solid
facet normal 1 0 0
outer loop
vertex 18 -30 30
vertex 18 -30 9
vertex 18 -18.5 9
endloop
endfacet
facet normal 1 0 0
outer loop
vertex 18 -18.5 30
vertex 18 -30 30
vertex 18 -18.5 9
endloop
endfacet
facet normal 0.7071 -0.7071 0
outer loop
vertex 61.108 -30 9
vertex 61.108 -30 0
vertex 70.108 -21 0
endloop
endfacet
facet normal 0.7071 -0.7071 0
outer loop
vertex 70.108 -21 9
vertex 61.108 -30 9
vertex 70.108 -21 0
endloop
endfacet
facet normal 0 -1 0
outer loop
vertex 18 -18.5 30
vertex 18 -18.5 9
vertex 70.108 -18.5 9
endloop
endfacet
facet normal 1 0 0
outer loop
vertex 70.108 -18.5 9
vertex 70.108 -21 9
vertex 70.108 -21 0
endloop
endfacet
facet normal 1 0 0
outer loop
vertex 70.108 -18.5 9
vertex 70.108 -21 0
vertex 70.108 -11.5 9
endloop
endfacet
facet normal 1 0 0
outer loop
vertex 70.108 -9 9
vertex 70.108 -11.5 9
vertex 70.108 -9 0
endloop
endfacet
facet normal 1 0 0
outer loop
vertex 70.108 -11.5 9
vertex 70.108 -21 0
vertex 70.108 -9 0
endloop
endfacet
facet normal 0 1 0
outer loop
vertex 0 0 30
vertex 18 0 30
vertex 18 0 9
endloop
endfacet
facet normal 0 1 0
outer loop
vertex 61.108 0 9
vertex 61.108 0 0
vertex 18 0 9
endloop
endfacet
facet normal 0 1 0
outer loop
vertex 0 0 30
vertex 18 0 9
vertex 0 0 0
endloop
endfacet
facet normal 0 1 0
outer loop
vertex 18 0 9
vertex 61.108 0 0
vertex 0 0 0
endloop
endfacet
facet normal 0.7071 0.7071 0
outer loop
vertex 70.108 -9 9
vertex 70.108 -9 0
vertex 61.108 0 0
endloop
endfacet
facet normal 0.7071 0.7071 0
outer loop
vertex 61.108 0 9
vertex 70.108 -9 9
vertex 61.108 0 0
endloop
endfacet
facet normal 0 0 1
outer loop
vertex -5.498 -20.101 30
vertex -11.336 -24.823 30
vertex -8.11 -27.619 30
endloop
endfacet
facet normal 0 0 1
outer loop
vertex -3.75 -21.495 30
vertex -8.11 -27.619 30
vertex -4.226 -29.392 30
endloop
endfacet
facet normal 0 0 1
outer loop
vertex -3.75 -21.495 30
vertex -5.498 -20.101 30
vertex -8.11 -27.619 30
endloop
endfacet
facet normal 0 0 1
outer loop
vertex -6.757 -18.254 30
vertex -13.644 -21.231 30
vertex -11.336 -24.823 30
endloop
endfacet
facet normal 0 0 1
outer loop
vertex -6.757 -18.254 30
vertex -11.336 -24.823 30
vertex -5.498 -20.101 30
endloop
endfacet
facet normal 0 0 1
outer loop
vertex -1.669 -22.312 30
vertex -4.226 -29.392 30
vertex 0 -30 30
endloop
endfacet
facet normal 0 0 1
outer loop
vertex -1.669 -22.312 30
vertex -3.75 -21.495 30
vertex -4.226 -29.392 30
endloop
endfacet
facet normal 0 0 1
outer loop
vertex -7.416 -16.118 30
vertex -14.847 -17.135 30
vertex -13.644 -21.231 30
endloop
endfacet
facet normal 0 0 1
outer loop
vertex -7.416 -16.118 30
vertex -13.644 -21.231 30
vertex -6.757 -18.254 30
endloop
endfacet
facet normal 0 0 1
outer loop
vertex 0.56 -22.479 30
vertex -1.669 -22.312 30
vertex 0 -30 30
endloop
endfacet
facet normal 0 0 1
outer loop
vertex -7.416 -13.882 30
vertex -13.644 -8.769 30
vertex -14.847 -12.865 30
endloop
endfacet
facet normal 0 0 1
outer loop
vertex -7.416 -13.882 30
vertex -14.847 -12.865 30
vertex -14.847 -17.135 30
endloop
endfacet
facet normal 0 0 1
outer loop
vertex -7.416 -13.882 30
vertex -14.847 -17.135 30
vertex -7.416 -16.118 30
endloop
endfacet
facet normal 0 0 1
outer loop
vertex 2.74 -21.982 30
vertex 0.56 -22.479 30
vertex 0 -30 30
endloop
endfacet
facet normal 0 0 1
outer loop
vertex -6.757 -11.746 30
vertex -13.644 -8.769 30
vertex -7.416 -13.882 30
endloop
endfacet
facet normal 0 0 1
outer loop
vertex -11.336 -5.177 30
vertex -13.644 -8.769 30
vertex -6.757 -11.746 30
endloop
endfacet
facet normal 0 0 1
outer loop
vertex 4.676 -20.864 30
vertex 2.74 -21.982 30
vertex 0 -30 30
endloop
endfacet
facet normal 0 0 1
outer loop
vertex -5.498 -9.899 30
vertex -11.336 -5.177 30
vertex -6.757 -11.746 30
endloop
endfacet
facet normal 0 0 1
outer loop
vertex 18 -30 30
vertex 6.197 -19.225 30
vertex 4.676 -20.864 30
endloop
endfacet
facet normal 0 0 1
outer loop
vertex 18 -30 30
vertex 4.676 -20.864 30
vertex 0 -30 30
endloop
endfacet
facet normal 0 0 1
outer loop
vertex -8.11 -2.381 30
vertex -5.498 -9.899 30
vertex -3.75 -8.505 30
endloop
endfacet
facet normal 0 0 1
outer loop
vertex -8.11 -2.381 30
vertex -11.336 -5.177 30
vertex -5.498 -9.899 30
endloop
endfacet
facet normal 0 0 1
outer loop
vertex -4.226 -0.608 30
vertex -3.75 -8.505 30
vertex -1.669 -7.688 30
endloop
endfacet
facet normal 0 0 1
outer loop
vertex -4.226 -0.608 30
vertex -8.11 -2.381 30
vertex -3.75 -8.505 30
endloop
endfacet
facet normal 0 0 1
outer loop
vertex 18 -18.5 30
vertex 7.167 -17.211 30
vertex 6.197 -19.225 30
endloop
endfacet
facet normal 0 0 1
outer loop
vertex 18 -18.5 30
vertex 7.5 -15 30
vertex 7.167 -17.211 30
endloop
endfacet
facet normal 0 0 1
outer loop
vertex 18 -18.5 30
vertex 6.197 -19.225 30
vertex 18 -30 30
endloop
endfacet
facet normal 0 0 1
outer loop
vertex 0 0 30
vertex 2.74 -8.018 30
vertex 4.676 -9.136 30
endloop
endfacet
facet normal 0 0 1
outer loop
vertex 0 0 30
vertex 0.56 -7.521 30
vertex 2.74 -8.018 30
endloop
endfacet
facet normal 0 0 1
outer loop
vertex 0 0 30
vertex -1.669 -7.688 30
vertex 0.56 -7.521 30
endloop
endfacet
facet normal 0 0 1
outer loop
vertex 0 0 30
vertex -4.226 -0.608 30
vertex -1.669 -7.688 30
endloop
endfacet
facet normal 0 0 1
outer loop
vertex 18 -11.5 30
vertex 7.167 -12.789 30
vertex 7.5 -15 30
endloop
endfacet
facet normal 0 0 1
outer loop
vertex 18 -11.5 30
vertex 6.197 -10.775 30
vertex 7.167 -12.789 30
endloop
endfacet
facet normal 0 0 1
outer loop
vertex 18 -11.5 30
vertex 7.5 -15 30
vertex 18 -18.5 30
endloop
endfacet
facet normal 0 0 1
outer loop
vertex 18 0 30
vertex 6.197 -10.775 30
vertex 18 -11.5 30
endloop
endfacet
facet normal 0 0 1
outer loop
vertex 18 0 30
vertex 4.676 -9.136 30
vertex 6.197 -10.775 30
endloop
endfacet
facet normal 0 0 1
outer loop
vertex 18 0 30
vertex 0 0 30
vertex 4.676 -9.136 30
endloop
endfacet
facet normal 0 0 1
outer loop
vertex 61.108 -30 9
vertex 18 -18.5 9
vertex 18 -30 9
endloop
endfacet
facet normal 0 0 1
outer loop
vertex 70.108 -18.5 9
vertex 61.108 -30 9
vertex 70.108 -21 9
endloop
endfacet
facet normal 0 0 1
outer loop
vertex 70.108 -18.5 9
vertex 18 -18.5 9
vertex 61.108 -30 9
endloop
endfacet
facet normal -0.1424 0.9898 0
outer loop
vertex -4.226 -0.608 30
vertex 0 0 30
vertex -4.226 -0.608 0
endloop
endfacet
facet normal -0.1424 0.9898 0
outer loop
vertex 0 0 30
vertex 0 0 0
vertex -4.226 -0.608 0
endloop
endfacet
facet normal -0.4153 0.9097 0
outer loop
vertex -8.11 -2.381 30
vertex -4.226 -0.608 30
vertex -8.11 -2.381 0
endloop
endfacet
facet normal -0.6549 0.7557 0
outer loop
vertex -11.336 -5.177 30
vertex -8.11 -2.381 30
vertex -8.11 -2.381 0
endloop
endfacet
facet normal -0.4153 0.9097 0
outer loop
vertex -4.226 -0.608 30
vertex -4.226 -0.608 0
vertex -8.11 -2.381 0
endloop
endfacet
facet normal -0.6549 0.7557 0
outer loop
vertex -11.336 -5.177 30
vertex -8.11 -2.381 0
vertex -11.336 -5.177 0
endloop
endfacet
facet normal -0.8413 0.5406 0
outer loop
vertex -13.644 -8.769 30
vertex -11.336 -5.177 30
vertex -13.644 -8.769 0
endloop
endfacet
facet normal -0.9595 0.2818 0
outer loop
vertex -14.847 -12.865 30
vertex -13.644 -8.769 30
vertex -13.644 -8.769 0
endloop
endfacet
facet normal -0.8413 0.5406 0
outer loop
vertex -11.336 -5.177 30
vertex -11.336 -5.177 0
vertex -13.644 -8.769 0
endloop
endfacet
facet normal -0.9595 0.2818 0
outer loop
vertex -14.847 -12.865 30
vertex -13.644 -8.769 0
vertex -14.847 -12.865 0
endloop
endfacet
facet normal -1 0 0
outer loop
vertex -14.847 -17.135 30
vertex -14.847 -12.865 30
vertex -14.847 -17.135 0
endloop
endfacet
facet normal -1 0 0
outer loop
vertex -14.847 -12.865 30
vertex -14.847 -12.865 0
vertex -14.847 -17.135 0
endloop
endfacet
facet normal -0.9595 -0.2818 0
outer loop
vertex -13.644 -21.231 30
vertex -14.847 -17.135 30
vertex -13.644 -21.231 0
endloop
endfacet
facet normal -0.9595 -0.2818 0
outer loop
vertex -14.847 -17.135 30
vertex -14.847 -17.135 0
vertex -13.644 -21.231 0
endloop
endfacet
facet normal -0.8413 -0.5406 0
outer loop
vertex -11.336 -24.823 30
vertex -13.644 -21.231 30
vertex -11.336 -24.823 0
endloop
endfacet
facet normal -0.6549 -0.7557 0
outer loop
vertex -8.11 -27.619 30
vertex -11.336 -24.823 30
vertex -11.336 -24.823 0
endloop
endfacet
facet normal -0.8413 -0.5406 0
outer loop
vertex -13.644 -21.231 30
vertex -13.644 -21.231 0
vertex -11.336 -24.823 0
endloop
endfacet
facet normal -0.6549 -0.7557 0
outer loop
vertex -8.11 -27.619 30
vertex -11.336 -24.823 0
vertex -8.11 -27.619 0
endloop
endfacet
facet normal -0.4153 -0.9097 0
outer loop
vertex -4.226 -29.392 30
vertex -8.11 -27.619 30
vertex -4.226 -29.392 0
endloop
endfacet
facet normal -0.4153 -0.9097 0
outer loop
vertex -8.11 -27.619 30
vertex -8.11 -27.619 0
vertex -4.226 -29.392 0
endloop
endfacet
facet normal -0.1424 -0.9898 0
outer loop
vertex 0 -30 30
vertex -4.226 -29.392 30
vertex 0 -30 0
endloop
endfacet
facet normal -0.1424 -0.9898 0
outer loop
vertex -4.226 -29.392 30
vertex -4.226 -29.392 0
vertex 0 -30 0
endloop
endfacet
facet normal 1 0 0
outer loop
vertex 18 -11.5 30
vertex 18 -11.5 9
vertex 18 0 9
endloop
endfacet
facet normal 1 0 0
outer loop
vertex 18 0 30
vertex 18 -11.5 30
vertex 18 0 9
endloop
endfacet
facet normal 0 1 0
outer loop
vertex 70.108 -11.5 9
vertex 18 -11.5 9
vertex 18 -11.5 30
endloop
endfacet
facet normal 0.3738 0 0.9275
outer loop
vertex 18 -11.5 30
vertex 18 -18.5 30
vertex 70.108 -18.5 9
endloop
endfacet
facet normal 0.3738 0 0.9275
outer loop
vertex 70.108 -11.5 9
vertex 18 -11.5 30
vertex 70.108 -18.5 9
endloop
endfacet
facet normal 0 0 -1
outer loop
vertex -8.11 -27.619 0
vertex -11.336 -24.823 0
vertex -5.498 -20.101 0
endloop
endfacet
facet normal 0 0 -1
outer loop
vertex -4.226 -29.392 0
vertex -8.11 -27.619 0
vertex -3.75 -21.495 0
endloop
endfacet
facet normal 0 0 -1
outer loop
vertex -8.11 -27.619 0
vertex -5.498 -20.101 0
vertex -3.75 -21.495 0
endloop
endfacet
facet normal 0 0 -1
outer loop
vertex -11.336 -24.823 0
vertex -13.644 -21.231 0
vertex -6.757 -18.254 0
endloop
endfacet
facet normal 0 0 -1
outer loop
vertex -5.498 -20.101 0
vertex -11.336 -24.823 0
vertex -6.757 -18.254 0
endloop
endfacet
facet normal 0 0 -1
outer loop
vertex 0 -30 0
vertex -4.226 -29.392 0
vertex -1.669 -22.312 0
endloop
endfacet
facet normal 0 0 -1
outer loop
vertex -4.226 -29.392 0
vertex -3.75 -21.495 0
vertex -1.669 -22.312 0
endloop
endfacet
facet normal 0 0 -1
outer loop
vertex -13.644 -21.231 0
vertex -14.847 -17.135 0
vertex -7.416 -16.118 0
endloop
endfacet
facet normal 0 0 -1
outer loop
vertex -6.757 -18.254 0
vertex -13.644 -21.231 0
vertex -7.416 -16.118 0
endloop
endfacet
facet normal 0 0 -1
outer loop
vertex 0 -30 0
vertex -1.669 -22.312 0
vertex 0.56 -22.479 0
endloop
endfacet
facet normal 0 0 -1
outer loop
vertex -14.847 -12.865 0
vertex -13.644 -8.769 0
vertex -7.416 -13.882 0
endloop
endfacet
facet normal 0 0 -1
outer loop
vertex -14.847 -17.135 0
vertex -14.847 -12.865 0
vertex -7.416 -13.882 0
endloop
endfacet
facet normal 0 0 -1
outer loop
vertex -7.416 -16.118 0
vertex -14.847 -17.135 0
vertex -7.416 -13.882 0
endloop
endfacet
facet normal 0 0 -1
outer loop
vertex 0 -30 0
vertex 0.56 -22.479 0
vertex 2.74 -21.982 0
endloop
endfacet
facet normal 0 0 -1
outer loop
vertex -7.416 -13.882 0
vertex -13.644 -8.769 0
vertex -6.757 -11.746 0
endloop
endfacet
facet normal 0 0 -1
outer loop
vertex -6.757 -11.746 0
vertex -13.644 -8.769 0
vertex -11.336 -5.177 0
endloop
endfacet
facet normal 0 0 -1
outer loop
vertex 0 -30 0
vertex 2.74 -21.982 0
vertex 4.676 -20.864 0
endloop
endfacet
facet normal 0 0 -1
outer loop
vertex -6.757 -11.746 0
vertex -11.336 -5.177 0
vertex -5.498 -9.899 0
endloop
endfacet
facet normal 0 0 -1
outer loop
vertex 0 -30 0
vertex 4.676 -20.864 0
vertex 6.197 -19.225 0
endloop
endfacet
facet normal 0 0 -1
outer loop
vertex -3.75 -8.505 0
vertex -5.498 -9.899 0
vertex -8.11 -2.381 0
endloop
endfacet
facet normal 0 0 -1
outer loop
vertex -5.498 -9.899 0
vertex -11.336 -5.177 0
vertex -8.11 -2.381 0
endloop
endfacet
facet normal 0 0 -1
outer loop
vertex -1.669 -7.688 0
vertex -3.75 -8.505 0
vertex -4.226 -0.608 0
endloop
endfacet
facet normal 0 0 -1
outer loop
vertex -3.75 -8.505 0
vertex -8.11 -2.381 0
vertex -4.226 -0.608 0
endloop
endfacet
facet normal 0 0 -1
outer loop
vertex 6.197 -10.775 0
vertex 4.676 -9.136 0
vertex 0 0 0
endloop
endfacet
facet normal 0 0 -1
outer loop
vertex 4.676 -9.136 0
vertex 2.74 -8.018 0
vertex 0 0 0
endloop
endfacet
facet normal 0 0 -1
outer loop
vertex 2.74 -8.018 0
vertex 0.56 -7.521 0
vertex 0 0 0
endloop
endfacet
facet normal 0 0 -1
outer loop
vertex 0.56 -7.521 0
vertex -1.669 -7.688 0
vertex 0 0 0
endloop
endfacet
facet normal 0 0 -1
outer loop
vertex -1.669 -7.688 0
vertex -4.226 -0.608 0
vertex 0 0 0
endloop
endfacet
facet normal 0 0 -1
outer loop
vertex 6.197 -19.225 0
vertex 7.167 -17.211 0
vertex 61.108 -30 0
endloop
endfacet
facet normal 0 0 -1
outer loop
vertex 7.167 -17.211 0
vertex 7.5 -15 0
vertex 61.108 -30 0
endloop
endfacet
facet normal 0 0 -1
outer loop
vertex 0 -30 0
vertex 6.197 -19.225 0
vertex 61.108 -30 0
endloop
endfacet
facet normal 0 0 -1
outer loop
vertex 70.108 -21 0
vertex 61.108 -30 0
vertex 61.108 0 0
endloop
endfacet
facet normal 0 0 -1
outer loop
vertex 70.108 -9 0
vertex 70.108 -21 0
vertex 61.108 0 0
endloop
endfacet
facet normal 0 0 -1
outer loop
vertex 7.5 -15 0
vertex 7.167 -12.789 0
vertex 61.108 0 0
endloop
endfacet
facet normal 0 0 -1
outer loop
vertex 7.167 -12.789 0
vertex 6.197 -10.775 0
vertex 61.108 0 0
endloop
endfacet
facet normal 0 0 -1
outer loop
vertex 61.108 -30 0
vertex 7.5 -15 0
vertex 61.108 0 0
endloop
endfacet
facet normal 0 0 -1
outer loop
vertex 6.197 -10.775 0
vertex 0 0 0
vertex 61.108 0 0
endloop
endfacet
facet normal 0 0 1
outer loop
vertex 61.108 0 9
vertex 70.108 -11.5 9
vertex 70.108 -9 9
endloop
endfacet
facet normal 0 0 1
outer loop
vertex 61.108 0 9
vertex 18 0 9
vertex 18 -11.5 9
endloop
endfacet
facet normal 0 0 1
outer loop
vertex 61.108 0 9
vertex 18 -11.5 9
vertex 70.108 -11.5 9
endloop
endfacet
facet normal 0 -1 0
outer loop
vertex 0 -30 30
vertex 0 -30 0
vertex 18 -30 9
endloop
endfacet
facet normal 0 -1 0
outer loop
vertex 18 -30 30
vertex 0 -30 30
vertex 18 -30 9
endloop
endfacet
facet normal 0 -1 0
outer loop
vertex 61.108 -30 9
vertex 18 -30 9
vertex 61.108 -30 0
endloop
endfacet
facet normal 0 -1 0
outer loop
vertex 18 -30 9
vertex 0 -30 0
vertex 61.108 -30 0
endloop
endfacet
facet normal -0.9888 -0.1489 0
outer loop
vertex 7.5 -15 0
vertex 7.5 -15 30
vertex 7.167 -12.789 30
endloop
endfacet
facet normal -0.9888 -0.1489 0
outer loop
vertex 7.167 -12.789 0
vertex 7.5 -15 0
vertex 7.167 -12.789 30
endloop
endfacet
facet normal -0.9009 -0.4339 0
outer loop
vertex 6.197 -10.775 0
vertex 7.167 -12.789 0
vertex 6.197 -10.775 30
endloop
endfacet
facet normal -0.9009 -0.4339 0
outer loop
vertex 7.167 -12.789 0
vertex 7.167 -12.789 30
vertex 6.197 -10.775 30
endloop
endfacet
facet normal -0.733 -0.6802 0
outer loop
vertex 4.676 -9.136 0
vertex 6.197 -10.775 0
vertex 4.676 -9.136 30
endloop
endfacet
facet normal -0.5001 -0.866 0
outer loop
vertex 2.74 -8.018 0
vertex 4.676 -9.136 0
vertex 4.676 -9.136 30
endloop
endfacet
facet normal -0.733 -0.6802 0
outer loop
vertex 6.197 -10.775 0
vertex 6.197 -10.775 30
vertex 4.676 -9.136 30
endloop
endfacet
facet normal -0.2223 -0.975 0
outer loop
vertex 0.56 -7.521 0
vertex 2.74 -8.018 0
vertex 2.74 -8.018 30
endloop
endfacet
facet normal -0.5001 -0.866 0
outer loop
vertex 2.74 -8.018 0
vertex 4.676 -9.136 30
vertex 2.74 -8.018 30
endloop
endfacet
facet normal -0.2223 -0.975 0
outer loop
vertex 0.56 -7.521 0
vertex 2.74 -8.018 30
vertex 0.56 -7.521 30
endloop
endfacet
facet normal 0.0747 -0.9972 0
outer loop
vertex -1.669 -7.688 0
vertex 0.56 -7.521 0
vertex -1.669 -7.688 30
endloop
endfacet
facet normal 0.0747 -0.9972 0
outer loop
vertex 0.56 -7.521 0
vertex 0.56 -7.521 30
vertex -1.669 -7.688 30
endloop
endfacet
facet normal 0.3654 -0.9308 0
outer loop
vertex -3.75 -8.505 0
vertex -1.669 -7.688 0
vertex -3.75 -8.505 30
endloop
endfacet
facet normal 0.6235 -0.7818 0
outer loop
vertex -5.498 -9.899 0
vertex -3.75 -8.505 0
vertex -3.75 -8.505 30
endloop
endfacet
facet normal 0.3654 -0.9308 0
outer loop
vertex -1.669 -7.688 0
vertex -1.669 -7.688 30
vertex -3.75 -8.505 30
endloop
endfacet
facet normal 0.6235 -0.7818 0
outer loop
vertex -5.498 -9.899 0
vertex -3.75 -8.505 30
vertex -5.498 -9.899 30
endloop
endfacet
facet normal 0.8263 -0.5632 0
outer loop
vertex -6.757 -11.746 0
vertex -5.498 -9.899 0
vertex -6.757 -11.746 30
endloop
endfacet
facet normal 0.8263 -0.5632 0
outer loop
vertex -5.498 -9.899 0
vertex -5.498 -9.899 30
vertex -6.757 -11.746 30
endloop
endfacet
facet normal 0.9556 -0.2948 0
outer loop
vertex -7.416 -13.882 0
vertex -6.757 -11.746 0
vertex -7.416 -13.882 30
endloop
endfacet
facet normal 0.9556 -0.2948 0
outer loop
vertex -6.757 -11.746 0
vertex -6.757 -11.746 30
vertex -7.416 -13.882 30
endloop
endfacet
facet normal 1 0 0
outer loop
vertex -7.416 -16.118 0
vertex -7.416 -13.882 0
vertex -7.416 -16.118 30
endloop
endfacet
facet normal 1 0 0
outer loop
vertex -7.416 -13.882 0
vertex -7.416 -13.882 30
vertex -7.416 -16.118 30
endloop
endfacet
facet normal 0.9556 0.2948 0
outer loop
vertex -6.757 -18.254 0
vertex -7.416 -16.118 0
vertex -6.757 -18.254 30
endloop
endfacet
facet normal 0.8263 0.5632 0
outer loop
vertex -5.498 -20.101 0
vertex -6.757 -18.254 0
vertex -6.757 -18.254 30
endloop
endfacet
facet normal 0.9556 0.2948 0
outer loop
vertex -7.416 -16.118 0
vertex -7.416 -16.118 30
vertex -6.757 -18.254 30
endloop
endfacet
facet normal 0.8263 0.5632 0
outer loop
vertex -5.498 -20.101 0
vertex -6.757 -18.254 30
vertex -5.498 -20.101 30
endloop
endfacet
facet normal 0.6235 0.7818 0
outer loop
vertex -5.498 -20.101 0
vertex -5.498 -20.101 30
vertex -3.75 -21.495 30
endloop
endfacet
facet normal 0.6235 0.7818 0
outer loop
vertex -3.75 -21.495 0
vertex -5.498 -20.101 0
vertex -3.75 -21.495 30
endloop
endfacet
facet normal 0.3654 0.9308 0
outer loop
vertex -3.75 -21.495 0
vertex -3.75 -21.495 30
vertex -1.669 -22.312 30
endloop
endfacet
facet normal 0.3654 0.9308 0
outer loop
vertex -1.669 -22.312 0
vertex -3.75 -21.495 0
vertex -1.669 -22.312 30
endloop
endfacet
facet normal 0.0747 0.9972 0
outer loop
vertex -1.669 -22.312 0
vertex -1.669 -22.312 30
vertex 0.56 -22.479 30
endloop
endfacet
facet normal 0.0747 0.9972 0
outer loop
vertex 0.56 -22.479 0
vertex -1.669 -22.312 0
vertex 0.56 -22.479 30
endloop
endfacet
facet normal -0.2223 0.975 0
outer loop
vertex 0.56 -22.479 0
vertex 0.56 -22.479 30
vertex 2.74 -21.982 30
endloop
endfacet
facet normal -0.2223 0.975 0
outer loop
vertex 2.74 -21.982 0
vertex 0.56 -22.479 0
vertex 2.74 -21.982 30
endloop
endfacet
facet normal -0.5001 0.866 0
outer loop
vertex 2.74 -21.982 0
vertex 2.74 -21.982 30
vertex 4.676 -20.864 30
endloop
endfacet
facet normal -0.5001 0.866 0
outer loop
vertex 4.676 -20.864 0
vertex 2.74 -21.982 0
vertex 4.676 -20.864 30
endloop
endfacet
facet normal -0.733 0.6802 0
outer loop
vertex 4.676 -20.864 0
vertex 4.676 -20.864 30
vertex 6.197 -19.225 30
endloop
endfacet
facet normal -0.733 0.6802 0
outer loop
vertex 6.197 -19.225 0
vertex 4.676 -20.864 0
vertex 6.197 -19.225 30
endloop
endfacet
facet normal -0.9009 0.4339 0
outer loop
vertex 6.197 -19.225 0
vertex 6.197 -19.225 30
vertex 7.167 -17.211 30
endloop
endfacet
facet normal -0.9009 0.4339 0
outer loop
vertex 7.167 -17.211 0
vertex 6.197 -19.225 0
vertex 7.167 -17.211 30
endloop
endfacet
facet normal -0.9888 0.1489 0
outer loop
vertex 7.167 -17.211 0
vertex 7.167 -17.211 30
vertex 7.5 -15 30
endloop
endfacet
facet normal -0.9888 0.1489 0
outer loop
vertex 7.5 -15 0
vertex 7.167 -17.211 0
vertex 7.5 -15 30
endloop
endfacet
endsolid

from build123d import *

# Parameters (mm, degrees)
F1_DEPTH = 9
F3_DEPTH = 21
F4_R     = 7.5
F5_DEPTH = 37.3
F6_W     = 52.1081472671
F6_H     = 7
F7_DEPTH = 21
F9_DEPTH = 25


with BuildPart() as f1:
    # F0 (on Top) → F1 (new body)
    with BuildSketch(Plane.XY):
        with BuildLine():
            Line((61.1081472671, 0), (0, 0))
            ThreePointArc((0, 0), (-15, -15), (0, -30))
            Line((0, -30), (61.1081472671, -30))
            Line((61.1081472671, -30), (70.1081472671, -21))
            Line((70.1081472671, -21), (70.1081472671, -9))
            Line((70.1081472671, -9), (61.1081472671, 0))
        make_face()
    extrude(amount=F1_DEPTH)

    # F2 (on face) → F3 (join)
    with BuildSketch(Plane.XY.offset(9)):
        with BuildLine():
            Line((18, -30), (18, 0))
            Line((18, 0), (0, 0))
            ThreePointArc((0, 0), (-15, -15), (0, -30))
            Line((0, -30), (18, -30))
        make_face()
    extrude(amount=F3_DEPTH)

    # F4 (on face) → F5 (cut)
    with BuildSketch(Plane.XY.offset(30)):
        with Locations((0, -15)):
            Circle(F4_R)
    extrude(amount=-F5_DEPTH, mode=Mode.SUBTRACT)

    # F6 (on face) → F7 (join)
    with BuildSketch(Plane.XY.offset(9)):
        with Locations((44.0540736336, -15)):
            Rectangle(F6_W, F6_H)
    extrude(amount=F7_DEPTH)

    # F8 (on face) → F9 (cut)
    with BuildSketch(Plane.XZ.offset(18.5)):
        Polygon((70.1081472671, 30), (18, 30), (70.1081472671, 9), align=None)
    extrude(amount=-F9_DEPTH, mode=Mode.SUBTRACT)


solid = f1.part
